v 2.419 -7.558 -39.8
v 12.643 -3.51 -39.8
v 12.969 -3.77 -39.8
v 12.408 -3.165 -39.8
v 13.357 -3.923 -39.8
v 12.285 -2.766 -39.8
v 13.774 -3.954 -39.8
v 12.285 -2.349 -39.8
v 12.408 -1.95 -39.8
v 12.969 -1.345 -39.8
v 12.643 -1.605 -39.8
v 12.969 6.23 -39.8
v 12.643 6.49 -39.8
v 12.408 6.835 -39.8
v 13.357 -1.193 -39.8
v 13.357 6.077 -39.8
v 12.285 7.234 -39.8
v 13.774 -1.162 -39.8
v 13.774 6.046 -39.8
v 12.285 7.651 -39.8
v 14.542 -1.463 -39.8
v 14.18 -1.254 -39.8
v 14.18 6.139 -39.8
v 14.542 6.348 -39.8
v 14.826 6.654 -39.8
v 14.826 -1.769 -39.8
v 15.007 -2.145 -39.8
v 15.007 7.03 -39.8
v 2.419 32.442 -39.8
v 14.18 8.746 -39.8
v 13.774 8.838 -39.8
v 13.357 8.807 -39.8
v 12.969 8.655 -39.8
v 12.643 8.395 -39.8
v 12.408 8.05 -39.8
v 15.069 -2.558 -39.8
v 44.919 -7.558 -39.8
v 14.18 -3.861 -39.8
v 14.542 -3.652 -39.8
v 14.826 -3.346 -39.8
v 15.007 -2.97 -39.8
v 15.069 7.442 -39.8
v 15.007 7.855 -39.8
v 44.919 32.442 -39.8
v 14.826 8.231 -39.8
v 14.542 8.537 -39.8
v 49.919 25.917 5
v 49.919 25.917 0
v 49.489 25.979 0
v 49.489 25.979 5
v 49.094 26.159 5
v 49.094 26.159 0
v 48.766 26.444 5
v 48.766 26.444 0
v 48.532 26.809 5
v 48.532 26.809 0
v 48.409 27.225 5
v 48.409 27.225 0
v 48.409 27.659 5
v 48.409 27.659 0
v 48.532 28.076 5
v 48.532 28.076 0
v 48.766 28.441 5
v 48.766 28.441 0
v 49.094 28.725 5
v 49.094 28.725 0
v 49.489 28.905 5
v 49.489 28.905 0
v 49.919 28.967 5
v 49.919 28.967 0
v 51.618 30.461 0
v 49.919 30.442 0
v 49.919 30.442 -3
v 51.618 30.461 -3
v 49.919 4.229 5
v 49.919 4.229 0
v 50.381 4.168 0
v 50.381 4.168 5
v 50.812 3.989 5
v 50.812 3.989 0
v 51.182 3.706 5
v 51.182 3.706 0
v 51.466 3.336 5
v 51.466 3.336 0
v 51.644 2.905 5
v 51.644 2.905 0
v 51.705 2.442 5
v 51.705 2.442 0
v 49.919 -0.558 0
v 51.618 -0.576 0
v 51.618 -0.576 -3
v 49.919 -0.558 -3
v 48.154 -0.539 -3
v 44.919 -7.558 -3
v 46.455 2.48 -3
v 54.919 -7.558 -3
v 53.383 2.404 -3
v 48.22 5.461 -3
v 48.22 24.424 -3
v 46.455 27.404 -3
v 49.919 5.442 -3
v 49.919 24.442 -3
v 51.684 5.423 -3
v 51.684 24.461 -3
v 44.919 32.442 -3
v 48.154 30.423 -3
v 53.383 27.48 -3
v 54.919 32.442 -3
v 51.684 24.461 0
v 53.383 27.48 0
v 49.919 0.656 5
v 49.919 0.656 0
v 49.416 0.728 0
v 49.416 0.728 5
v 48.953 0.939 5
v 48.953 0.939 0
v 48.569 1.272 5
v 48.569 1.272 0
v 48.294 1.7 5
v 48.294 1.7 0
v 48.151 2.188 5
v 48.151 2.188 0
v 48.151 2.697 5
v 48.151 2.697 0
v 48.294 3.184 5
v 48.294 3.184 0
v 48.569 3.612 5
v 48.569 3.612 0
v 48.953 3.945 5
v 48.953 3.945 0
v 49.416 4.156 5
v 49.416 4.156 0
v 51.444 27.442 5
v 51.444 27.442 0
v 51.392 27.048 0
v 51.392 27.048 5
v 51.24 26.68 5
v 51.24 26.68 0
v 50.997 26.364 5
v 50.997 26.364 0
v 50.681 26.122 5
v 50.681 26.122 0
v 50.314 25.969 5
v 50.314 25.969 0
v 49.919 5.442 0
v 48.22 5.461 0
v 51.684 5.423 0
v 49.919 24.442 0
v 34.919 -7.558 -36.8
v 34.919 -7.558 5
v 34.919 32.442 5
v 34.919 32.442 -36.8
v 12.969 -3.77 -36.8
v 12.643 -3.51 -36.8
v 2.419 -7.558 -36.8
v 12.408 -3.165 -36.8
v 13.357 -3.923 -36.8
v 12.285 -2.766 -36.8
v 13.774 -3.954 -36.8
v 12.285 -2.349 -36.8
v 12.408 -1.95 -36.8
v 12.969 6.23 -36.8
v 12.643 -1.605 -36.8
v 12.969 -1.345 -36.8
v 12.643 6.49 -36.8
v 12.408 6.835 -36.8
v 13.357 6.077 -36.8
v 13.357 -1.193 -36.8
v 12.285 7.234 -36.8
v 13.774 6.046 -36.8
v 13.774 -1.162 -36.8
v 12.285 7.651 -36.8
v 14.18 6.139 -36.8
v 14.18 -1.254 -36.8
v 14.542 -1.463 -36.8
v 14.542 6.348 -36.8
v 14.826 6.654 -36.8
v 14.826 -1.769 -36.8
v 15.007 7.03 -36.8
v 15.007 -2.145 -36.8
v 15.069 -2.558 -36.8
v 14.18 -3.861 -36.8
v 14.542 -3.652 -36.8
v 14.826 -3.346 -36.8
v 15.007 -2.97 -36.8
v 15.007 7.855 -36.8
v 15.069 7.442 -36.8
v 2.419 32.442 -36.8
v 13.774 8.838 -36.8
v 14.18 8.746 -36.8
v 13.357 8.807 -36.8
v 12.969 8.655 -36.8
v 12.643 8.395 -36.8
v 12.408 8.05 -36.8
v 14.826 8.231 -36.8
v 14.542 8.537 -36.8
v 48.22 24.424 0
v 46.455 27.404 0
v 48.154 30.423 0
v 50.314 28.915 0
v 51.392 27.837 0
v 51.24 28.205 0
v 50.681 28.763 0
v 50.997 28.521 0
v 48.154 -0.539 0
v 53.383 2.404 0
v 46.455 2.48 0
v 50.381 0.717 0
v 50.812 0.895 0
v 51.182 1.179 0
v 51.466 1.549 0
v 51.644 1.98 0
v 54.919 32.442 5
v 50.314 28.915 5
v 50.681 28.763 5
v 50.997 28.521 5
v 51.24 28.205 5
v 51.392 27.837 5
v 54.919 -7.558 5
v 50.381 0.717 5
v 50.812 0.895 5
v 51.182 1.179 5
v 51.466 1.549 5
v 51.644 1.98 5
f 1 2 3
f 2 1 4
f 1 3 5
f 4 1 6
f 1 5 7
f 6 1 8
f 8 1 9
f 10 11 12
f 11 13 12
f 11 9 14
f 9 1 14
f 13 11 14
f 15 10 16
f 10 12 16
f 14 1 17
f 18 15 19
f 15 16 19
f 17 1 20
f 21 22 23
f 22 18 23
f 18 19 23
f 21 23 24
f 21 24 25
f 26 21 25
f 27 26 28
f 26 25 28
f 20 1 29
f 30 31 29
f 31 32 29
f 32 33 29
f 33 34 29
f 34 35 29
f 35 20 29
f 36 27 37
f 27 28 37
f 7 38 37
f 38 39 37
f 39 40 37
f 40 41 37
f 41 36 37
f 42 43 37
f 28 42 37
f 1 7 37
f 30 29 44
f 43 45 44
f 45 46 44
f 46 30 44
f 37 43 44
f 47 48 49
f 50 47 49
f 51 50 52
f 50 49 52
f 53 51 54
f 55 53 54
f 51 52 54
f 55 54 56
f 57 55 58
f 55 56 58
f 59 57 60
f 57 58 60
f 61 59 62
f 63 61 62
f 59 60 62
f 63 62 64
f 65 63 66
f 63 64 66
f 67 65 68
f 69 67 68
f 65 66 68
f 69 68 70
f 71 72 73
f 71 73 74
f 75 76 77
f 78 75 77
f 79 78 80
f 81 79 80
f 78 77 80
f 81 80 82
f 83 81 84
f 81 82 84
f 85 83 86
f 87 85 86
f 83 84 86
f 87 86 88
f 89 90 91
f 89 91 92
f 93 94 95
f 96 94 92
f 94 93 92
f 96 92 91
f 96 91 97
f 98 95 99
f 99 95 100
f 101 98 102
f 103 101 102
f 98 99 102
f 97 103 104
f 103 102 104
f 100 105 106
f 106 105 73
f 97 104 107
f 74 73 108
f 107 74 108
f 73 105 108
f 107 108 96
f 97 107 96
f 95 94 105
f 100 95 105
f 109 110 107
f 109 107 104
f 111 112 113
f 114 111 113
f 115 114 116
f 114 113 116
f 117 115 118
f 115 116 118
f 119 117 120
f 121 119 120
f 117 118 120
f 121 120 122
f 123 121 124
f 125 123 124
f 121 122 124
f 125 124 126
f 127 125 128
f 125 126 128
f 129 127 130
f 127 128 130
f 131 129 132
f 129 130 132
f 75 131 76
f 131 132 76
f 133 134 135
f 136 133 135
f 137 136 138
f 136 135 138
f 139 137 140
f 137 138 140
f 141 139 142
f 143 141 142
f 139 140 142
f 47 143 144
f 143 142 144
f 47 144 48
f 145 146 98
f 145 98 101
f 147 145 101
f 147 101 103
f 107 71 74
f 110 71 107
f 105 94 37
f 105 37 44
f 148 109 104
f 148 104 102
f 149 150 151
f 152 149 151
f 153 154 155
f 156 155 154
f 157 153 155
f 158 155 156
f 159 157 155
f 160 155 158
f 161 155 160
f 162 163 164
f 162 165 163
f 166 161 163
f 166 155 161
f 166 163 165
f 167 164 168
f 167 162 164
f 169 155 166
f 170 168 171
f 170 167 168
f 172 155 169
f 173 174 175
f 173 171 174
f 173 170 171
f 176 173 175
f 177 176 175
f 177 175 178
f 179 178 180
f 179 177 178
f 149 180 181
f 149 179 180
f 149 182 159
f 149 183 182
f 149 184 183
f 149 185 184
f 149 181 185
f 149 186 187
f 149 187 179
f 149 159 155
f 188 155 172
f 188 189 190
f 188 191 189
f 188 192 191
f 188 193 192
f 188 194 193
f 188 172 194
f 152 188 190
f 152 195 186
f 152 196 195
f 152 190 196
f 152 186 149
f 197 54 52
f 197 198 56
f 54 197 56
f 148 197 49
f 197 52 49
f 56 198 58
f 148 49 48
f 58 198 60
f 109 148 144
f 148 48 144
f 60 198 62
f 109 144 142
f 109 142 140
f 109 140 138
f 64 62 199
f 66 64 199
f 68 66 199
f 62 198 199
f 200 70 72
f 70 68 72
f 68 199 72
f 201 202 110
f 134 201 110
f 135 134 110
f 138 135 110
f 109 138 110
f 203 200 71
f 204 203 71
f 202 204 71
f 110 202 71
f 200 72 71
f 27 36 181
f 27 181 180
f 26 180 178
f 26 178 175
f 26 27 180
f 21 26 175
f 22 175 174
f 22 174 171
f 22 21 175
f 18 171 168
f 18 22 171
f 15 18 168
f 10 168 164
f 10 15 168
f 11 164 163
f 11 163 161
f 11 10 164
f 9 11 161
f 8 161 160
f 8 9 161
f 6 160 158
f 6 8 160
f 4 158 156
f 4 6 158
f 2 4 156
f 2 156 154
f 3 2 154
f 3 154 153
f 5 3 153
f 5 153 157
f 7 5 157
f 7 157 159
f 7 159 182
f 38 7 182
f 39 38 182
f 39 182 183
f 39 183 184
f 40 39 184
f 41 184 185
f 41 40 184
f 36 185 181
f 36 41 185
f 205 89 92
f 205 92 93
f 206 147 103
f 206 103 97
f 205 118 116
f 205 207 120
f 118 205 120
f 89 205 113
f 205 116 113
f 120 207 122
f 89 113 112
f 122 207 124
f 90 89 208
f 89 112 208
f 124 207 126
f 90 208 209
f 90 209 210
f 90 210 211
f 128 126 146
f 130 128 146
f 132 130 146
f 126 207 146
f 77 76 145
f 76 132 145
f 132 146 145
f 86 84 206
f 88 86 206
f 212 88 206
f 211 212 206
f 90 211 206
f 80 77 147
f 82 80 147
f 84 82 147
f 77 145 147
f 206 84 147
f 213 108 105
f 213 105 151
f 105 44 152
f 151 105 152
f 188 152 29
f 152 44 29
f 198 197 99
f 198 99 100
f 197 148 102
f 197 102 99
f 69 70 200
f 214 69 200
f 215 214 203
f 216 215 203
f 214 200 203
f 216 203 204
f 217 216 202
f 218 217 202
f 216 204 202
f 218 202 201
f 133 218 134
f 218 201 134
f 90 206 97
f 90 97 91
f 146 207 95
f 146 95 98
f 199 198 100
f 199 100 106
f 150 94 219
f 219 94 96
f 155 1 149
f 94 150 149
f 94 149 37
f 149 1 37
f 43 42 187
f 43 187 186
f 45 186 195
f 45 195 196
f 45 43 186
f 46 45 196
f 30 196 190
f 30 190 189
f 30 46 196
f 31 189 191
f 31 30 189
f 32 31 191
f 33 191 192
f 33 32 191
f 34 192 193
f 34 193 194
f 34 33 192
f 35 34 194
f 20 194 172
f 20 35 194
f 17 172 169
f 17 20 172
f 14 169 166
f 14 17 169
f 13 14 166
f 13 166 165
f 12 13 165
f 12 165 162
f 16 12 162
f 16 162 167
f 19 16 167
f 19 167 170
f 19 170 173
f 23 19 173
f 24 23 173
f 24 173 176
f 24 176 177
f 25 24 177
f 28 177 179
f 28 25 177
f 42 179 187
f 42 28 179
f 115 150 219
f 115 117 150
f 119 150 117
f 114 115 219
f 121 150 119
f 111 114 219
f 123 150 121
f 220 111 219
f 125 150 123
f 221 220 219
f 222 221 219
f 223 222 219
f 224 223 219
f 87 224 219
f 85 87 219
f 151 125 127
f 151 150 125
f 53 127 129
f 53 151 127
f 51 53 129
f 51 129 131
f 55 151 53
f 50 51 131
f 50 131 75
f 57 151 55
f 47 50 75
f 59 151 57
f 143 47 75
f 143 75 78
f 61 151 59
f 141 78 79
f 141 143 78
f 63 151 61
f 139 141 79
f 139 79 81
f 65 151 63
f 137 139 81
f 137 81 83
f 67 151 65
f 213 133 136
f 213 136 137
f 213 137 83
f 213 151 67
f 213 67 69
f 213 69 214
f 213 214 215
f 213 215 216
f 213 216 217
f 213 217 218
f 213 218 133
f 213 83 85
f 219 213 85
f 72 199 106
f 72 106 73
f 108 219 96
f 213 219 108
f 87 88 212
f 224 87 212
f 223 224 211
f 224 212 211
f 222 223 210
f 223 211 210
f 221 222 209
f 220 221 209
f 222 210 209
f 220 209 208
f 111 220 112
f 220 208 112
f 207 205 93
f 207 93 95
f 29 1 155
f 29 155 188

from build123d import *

# Parameters (mm, degrees)
SKETCH1_W           = 10
SKETCH1_H           = 40
BOSS_EXTRUDE1_DEPTH = 5
SKETCH1_4_W         = 10
SKETCH1_4_H         = 40
BOSS_EXTRUDE2_DEPTH = 3
BOSS_EXTRUDE3_START = 5
SKETCH1_5_W         = 10
SKETCH1_5_H         = 40
BOSS_EXTRUDE3_DEPTH = 44.8
BOSS_EXTRUDE4_START = -39.8
SKETCH1_6_W         = 22.5
SKETCH1_6_H         = 40
SKETCH1_6_R         = 1.4
SKETCH1_6_W_2       = 10
BOSS_EXTRUDE4_DEPTH = 3


with BuildPart() as part:
    # Sketch1 → Boss-Extrude1 (new body)
    with BuildSketch(Plane.XY):
        Polygon((54.918901731, 32.442311257), (49.918901731, 32.442311257), (49.918901731, 30.44249106), (51.6180048, 30.461093919), (53.382795739, 27.480236167), (51.683692671, 24.461453505), (49.918901731, 24.442131453), (49.918901731, 5.44249106), (51.683692671, 5.423169009), (53.382795739, 2.404386347), (51.6180048, -0.576471406), (49.918901731, -0.557868547), (49.918901731, -7.557688743), (54.918901731, -7.557688743), align=None)
        Polygon((49.918901731, 32.442311257), (44.918901731, 32.442311257), (44.918901731, -7.557688743), (49.918901731, -7.557688743), (49.918901731, -0.557868547), (48.154110791, -0.538546495), (46.455007723, 2.480236167), (48.219798662, 5.461093919), (49.918901731, 5.44249106), (49.918901731, 24.442131453), (48.219798662, 24.423528594), (46.455007723, 27.404386347), (48.154110791, 30.423169009), (49.918901731, 30.44249106), align=None)
        with BuildLine():
            Line((49.918901731, 0.655890403), (49.918901731, -0.557868547))
            Line((49.918901731, -0.557868547), (51.6180048, -0.576471406))
            Line((51.6180048, -0.576471406), (53.382795739, 2.404386347))
            Line((53.382795739, 2.404386347), (51.683692671, 5.423169009))
            Line((51.683692671, 5.423169009), (49.918901731, 5.44249106))
            Line((49.918901731, 5.44249106), (49.918901731, 4.22873211))
            ThreePointArc((49.918901731, 4.22873211), (51.182092031, 3.705501556), (51.705322585, 2.442311257))
            ThreePointArc((51.705322585, 2.442311257), (51.182092031, 1.179120957), (49.918901731, 0.655890403))
        make_face()
        with BuildLine():
            Line((48.154110791, -0.538546495), (49.918901731, -0.557868547))
            Line((49.918901731, -0.557868547), (49.918901731, 0.655890403))
            ThreePointArc((49.918901731, 0.655890403), (48.132480877, 2.442311257), (49.918901731, 4.22873211))
            Line((49.918901731, 4.22873211), (49.918901731, 5.44249106))
            Line((49.918901731, 5.44249106), (48.219798662, 5.461093919))
            Line((48.219798662, 5.461093919), (46.455007723, 2.480236167))
            Line((46.455007723, 2.480236167), (48.154110791, -0.538546495))
        make_face()
        with BuildLine():
            Line((51.6180048, 30.461093919), (49.918901731, 30.44249106))
            Line((49.918901731, 30.44249106), (49.918901731, 28.967240827))
            ThreePointArc((49.918901731, 28.967240827), (50.997189771, 28.520599297), (51.443831301, 27.442311257))
            ThreePointArc((51.443831301, 27.442311257), (50.997189771, 26.364023217), (49.918901731, 25.917381686))
            Line((49.918901731, 25.917381686), (49.918901731, 24.442131453))
            Line((49.918901731, 24.442131453), (51.683692671, 24.461453505))
            Line((51.683692671, 24.461453505), (53.382795739, 27.480236167))
            Line((53.382795739, 27.480236167), (51.6180048, 30.461093919))
        make_face()
        with BuildLine():
            Line((49.918901731, 28.967240827), (49.918901731, 30.44249106))
            Line((49.918901731, 30.44249106), (48.154110791, 30.423169009))
            Line((48.154110791, 30.423169009), (46.455007723, 27.404386347))
            Line((46.455007723, 27.404386347), (48.219798662, 24.423528594))
            Line((48.219798662, 24.423528594), (49.918901731, 24.442131453))
            Line((49.918901731, 24.442131453), (49.918901731, 25.917381686))
            ThreePointArc((49.918901731, 25.917381686), (48.39397216, 27.442311257), (49.918901731, 28.967240827))
        make_face()
        with Locations((39.918901731, 12.442311257)):
            Rectangle(SKETCH1_W, SKETCH1_H)
    extrude(amount=BOSS_EXTRUDE1_DEPTH)

    # Sketch1<4> → Boss-Extrude2 (add)
    with BuildSketch(Plane.XY):
        Polygon((49.918901731, 32.442311257), (44.918901731, 32.442311257), (44.918901731, -7.557688743), (49.918901731, -7.557688743), (49.918901731, -0.557868547), (48.154110791, -0.538546495), (46.455007723, 2.480236167), (48.219798662, 5.461093919), (49.918901731, 5.44249106), (49.918901731, 24.442131453), (48.219798662, 24.423528594), (46.455007723, 27.404386347), (48.154110791, 30.423169009), (49.918901731, 30.44249106), align=None)
        Polygon((54.918901731, 32.442311257), (49.918901731, 32.442311257), (49.918901731, 30.44249106), (51.6180048, 30.461093919), (53.382795739, 27.480236167), (51.683692671, 24.461453505), (49.918901731, 24.442131453), (49.918901731, 5.44249106), (51.683692671, 5.423169009), (53.382795739, 2.404386347), (51.6180048, -0.576471406), (49.918901731, -0.557868547), (49.918901731, -7.557688743), (54.918901731, -7.557688743), align=None)
        with Locations((39.918901731, 12.442311257)):
            Rectangle(SKETCH1_4_W, SKETCH1_4_H)
    extrude(amount=-BOSS_EXTRUDE2_DEPTH)

    # Sketch1<5> → Boss-Extrude3 (add)
    with BuildSketch(Plane.XY.offset(BOSS_EXTRUDE3_START)):
        with Locations((39.918901731, 12.442311257)):
            Rectangle(SKETCH1_5_W, SKETCH1_5_H)
    extrude(amount=-BOSS_EXTRUDE3_DEPTH)

    # Sketch1<6> → Boss-Extrude4 (add)
    with BuildSketch(Plane.XY.offset(BOSS_EXTRUDE4_START)):
        with Locations((13.668901731, 12.442311257)):
            Rectangle(SKETCH1_6_W, SKETCH1_6_H)
        with Locations((13.668901731, -2.557688743)):
            Circle(SKETCH1_6_R, mode=Mode.SUBTRACT)
        with Locations((13.668901731, 7.442311257)):
            Circle(SKETCH1_6_R, mode=Mode.SUBTRACT)
        with Locations((29.918901731, 12.442311257)):
            Rectangle(SKETCH1_6_W_2, SKETCH1_6_H)
    extrude(amount=BOSS_EXTRUDE4_DEPTH)


solid = part.part
